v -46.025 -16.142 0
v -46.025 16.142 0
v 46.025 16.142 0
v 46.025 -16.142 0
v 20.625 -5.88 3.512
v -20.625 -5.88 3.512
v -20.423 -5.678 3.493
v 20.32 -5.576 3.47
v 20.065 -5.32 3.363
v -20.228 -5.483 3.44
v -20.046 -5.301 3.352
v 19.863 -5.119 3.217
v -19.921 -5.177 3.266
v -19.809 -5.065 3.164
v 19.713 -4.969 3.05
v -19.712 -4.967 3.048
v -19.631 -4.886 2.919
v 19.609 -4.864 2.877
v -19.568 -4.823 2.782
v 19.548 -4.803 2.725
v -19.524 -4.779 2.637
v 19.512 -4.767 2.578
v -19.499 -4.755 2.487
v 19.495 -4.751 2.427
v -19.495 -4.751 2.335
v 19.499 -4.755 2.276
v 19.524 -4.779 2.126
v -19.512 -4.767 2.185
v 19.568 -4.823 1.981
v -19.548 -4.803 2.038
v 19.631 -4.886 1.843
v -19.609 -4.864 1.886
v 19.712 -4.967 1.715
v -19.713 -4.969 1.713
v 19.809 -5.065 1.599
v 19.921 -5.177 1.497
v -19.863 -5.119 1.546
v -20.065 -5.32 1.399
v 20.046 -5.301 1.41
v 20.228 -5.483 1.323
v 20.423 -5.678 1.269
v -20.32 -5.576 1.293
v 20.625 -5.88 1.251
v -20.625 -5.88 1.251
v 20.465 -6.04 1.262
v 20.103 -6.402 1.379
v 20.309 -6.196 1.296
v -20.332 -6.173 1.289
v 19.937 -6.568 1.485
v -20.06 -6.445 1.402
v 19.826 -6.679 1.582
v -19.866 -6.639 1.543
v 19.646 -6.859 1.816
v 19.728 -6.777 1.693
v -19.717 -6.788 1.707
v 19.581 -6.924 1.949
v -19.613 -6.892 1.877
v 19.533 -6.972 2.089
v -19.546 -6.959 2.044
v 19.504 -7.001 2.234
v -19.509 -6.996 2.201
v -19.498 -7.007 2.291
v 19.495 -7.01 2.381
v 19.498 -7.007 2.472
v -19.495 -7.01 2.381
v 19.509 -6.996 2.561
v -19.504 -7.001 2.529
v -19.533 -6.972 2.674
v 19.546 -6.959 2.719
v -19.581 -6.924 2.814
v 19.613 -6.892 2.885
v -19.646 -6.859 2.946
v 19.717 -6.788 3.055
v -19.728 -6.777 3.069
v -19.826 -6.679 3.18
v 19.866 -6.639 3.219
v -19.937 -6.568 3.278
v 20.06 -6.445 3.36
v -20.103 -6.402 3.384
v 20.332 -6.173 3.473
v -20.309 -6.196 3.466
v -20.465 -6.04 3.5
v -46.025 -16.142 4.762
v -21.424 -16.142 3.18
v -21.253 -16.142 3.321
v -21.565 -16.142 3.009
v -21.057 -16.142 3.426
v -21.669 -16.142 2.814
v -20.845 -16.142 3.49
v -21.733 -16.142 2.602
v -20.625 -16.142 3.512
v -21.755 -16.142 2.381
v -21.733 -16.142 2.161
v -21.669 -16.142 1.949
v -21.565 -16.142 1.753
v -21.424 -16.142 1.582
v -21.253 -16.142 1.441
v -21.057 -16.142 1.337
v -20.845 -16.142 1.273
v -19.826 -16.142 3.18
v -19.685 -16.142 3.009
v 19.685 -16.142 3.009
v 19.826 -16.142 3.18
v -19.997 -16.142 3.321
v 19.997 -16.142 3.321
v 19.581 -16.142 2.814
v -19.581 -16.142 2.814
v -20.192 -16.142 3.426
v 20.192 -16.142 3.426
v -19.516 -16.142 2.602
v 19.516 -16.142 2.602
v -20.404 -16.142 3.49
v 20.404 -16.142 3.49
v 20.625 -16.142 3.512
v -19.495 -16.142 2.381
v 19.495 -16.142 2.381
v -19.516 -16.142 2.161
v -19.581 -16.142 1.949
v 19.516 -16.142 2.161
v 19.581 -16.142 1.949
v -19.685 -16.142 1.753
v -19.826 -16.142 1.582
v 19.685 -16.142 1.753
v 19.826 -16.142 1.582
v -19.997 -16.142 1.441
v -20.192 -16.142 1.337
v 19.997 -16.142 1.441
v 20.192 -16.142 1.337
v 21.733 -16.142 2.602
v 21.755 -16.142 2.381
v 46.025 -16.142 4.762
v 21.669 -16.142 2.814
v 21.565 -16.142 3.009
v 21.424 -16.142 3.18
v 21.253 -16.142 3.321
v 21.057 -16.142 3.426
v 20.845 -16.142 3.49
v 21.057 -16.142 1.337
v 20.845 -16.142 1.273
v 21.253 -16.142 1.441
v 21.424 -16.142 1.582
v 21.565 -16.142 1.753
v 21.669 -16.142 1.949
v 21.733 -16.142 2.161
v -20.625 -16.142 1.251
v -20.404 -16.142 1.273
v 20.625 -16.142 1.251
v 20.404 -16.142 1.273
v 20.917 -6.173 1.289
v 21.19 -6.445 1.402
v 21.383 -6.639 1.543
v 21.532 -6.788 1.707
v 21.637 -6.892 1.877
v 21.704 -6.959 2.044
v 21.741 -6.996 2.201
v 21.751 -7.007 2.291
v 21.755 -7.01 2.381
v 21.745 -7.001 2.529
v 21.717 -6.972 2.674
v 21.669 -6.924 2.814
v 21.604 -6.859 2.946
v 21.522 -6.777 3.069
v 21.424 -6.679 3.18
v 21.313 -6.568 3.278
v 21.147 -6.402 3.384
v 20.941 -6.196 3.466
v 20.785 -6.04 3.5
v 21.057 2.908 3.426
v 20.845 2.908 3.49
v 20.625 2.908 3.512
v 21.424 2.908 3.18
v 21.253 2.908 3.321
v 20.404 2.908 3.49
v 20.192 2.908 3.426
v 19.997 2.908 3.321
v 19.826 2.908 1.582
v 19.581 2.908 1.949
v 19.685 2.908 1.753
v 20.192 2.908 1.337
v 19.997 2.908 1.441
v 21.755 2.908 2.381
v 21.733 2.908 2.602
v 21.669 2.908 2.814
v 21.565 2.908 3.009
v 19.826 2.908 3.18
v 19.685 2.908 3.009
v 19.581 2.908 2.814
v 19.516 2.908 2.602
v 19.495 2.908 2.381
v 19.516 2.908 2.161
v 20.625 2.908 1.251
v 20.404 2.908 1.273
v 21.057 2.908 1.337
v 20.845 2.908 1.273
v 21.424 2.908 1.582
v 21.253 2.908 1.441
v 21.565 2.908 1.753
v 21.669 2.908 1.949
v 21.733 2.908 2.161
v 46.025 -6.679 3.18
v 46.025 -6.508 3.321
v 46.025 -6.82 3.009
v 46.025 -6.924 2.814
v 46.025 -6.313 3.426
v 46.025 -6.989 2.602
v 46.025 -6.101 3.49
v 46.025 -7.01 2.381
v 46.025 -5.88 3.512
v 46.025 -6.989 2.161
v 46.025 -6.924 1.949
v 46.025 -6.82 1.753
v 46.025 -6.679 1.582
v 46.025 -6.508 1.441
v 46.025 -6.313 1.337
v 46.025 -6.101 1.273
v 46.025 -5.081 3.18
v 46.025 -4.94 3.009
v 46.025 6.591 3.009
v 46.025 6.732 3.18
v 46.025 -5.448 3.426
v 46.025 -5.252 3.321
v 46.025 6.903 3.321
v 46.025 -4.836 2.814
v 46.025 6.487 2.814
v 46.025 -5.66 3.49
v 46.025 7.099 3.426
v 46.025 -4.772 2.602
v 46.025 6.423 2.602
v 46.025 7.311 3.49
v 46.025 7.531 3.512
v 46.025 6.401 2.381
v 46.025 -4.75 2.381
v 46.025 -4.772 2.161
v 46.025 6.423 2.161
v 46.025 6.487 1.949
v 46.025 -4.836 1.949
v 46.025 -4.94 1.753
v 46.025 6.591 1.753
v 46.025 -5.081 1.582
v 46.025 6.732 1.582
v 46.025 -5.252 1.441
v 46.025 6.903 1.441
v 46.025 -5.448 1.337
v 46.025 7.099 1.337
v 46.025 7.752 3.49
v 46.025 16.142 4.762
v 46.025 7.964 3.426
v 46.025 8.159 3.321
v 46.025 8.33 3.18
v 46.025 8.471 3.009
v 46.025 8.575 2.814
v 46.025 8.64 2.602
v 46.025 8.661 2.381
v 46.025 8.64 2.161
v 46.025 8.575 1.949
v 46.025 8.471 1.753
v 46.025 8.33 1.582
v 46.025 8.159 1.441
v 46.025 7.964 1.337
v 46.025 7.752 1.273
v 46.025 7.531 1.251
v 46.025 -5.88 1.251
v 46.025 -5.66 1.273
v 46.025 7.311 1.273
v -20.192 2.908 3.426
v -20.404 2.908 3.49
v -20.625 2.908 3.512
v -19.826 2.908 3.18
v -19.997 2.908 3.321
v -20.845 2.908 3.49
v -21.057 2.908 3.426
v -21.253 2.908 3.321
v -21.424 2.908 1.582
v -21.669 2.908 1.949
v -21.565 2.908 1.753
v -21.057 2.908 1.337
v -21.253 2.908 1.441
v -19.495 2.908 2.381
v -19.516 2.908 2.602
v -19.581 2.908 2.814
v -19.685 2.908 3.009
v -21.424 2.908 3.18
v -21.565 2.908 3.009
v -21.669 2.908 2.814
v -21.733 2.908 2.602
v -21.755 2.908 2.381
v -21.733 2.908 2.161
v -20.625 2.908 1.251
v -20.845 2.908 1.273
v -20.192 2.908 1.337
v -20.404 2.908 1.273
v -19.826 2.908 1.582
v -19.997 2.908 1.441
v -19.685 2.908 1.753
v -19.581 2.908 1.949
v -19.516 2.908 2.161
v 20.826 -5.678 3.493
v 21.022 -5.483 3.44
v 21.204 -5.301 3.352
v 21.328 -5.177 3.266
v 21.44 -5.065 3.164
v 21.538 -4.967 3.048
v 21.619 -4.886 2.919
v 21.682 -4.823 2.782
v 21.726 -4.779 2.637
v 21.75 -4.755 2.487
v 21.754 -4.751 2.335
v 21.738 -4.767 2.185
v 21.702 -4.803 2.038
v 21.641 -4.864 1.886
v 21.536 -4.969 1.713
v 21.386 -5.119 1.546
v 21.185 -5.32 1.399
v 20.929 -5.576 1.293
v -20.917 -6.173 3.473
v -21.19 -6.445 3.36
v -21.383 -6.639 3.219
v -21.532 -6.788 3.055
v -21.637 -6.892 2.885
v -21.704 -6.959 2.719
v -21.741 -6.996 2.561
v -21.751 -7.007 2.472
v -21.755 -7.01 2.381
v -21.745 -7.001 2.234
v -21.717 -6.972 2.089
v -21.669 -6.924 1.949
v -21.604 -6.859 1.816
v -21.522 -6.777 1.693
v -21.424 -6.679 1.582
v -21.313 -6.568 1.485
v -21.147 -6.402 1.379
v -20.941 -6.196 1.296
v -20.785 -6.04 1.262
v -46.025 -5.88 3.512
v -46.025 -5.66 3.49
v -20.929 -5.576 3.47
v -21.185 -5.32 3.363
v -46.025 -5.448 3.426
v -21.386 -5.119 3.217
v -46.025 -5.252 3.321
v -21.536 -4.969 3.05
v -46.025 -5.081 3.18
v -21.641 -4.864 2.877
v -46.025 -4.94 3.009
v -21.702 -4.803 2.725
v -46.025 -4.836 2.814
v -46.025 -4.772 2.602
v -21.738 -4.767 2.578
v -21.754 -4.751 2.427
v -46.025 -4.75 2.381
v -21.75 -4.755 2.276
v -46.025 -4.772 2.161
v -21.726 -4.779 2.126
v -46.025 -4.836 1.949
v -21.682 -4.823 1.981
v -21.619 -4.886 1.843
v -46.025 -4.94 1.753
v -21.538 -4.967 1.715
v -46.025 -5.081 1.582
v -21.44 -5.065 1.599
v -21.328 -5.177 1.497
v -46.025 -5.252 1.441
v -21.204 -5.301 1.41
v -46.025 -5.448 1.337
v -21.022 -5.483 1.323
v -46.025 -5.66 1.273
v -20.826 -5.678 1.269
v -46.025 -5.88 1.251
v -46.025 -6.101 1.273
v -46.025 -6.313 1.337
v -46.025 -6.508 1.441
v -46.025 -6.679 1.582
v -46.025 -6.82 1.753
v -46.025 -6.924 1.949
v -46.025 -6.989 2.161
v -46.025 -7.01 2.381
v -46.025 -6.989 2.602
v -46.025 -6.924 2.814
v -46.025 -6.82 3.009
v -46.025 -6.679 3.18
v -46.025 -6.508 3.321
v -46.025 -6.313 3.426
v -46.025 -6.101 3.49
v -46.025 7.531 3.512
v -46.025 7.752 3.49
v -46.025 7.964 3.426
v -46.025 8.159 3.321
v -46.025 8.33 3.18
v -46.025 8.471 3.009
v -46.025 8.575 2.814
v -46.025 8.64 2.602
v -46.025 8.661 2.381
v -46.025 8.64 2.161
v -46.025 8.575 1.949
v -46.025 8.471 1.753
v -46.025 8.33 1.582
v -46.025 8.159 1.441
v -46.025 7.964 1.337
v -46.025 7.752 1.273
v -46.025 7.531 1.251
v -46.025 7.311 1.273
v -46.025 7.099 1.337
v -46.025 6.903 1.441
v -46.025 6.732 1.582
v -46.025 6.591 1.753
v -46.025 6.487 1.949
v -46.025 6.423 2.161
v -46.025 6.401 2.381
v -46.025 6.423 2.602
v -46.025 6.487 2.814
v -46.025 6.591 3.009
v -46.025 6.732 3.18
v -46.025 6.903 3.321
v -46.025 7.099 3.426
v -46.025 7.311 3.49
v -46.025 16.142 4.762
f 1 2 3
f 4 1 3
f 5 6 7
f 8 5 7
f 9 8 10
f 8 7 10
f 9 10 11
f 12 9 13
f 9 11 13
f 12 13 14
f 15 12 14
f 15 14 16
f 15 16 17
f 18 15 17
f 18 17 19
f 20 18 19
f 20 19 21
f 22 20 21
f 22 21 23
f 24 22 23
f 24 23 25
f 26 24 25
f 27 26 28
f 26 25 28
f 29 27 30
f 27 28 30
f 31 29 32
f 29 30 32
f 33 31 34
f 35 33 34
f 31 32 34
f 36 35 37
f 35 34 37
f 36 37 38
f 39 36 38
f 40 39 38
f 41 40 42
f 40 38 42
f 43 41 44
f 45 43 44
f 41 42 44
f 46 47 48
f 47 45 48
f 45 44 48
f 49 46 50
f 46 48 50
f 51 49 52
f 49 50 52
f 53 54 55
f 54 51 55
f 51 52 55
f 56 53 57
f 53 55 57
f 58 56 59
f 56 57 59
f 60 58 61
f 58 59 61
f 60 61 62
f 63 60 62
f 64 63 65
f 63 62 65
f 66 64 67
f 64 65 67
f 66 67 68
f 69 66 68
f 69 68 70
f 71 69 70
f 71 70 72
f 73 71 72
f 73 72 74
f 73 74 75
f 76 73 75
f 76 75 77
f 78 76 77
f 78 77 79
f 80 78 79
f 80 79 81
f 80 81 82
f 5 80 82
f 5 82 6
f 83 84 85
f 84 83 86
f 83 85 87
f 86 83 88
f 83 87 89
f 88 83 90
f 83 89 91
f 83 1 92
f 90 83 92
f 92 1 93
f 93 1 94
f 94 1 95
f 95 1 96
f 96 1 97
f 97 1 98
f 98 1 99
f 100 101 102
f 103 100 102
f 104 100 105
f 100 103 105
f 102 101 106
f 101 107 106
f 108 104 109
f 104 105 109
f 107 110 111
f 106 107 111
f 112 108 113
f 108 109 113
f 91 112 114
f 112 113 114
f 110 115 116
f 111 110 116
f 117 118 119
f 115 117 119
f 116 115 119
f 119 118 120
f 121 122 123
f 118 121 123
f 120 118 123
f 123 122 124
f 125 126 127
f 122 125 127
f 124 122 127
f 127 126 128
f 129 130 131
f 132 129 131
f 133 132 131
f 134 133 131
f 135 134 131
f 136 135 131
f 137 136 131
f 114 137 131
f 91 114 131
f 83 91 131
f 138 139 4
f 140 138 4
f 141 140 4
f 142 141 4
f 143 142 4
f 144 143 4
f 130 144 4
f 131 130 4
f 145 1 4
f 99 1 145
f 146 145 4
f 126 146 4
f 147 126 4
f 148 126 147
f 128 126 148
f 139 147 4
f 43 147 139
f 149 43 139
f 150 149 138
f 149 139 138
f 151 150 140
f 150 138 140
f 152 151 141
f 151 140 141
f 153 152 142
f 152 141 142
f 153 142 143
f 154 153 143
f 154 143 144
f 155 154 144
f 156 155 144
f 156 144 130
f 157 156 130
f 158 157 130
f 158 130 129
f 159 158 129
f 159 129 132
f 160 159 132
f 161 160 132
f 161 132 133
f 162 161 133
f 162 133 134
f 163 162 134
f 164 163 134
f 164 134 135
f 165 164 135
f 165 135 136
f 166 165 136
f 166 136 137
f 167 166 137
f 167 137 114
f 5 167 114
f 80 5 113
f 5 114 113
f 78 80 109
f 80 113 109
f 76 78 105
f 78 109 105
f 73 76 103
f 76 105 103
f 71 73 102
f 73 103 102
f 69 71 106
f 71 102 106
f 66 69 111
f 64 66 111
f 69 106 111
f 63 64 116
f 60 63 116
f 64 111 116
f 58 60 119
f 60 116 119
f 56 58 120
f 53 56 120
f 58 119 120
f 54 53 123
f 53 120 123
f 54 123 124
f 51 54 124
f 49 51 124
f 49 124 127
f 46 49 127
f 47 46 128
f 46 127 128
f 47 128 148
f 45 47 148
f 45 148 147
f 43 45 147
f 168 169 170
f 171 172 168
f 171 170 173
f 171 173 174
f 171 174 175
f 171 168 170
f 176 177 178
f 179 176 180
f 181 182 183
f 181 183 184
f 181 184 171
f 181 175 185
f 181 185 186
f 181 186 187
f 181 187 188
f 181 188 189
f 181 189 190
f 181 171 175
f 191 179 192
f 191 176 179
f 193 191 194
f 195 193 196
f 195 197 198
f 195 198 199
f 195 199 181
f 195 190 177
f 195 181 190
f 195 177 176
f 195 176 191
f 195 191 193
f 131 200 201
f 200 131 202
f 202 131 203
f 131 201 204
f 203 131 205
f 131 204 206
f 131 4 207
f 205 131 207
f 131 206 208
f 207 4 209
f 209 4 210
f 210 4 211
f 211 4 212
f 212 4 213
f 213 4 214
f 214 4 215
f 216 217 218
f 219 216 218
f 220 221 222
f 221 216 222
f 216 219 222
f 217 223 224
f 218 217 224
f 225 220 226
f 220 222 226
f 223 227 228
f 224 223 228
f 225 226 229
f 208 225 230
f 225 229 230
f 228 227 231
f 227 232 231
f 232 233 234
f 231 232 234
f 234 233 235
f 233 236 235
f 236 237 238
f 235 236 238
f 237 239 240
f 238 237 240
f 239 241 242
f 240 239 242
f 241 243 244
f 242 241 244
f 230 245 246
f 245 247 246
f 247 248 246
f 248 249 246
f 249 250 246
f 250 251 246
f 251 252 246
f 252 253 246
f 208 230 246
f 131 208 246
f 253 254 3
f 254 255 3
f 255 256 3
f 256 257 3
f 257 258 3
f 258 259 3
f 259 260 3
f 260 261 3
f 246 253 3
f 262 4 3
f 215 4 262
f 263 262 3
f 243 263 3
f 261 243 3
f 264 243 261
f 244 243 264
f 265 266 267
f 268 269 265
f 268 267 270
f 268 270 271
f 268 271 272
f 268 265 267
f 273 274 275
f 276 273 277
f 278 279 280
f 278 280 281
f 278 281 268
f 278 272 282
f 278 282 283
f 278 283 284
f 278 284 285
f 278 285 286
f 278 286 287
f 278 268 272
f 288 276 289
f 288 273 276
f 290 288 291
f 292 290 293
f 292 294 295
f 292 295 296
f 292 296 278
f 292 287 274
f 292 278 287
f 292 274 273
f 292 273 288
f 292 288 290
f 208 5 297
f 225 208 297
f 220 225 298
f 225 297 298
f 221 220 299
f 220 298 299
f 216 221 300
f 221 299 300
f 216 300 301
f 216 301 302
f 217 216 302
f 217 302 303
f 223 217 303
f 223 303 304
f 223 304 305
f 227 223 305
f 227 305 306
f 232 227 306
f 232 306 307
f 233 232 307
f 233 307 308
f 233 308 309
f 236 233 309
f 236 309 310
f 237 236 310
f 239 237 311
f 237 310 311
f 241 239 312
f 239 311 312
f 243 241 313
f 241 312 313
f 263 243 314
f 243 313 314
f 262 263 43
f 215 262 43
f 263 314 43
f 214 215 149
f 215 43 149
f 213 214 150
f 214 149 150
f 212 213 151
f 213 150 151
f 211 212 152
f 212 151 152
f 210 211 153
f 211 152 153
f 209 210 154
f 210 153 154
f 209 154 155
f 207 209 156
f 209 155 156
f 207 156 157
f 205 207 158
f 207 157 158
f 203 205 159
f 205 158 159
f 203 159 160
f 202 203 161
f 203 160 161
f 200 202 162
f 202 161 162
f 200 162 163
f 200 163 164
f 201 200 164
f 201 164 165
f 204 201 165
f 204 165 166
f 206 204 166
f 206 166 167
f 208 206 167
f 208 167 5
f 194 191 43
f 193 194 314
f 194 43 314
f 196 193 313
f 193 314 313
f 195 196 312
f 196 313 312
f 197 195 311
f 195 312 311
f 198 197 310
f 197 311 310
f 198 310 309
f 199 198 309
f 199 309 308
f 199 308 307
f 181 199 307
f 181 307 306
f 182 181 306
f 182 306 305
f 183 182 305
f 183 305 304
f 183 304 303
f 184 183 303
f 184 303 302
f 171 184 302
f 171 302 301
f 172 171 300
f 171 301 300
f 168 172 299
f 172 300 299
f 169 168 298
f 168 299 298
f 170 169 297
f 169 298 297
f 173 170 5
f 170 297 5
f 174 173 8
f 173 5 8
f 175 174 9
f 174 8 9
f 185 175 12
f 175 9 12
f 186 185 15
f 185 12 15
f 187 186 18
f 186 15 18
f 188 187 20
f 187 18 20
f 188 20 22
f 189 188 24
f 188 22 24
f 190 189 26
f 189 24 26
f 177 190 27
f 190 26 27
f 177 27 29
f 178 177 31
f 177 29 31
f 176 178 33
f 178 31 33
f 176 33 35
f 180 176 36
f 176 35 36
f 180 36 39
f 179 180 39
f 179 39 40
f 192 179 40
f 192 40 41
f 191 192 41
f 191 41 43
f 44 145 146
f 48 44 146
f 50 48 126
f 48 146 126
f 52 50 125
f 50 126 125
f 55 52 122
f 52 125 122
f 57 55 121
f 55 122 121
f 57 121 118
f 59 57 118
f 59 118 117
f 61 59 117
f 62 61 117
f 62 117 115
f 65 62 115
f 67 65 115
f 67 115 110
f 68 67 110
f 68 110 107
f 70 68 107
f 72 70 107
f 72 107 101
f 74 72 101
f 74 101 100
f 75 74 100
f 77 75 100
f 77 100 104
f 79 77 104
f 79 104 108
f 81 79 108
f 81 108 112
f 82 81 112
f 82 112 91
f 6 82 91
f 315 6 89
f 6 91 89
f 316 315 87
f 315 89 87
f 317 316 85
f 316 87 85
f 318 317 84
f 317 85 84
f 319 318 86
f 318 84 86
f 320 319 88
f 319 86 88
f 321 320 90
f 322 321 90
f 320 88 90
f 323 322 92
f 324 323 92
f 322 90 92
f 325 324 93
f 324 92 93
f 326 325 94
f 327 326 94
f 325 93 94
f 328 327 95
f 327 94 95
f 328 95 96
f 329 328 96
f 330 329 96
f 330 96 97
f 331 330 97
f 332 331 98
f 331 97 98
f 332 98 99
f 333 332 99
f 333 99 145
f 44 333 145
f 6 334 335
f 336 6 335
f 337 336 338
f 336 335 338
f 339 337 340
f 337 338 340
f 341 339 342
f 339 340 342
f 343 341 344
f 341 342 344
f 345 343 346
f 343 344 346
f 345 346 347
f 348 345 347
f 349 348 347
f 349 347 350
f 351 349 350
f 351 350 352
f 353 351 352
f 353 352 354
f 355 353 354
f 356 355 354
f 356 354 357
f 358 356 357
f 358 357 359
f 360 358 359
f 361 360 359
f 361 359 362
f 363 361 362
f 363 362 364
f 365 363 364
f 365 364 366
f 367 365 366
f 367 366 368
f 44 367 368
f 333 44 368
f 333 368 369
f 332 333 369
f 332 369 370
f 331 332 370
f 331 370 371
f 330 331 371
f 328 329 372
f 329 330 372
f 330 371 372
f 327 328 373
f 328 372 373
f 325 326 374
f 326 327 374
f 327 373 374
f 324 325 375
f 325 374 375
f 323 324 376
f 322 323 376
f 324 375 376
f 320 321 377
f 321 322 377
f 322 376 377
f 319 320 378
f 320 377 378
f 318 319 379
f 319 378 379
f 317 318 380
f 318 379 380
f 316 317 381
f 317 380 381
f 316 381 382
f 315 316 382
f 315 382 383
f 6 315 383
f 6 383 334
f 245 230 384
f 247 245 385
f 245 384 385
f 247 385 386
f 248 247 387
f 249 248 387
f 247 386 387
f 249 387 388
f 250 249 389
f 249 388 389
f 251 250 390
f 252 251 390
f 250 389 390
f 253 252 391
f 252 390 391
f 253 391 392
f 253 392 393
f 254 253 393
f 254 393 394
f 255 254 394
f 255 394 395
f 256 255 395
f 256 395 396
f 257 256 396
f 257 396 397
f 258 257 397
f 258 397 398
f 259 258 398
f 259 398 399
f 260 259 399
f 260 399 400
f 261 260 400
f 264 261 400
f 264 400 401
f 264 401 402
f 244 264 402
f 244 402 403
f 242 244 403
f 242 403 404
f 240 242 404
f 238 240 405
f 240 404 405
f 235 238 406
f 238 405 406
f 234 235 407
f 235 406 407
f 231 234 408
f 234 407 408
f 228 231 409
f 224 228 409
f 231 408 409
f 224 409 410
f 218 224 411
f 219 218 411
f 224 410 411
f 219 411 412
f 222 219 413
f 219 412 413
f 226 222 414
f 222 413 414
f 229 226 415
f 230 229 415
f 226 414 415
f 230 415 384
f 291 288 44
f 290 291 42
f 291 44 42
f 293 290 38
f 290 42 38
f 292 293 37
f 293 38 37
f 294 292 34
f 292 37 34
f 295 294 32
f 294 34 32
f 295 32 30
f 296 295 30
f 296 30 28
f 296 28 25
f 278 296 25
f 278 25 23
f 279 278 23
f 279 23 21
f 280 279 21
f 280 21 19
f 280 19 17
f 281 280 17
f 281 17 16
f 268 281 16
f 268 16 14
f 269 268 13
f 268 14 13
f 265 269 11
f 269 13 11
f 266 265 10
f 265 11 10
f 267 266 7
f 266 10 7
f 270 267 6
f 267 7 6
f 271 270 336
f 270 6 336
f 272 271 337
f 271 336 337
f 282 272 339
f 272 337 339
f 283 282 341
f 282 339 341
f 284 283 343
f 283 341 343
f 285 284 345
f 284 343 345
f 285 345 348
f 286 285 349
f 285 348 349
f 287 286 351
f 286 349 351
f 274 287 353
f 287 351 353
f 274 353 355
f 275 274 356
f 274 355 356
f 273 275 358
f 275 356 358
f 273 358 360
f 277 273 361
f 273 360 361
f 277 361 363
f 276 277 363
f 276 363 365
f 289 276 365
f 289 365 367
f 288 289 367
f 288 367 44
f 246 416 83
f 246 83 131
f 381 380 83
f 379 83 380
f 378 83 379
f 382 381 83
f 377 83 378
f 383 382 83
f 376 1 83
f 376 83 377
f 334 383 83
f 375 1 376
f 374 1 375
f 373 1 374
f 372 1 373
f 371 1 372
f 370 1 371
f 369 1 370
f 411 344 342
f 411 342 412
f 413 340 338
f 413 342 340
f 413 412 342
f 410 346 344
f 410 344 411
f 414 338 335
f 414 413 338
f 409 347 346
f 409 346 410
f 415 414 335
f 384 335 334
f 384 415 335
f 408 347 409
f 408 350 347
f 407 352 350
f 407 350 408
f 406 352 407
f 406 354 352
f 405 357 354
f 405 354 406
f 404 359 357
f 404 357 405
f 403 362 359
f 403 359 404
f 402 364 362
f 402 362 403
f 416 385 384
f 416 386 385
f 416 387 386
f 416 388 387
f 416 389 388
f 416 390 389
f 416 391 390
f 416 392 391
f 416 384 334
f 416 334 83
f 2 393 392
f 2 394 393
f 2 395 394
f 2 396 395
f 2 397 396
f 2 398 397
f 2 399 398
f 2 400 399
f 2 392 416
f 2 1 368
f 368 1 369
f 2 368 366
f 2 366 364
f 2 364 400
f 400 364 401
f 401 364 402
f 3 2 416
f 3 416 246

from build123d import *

# Parameters (mm, degrees)
SKETCH1_W           = 92.0496
SKETCH1_H           = 32.2834
BOSS_EXTRUDE1_DEPTH = 4.7625
SKETCH2_R           = 1.1303
CUT_EXTRUDE1_DEPTH  = 19.05
SKETCH3_R           = 1.1303
CUT_EXTRUDE2_DEPTH  = 94.57544948


with BuildPart() as part:
    # Sketch1 → Boss-Extrude1 (new body)
    with BuildSketch(Plane.XY):
        Rectangle(SKETCH1_W, SKETCH1_H)
    extrude(amount=BOSS_EXTRUDE1_DEPTH)

    # Sketch2 → Cut-Extrude1 (cut)
    with BuildSketch(Plane.XZ.offset(16.1417)):
        with Locations(Location((-20.6248, 2.38125, 0), (0, 0, 270))):
            Circle(SKETCH2_R)
        with Locations(Location((20.6248, 2.38125, 0), (0, 0, 270))):
            Circle(SKETCH2_R)
    extrude(amount=-CUT_EXTRUDE1_DEPTH, mode=Mode.SUBTRACT)

    # Sketch3 → Cut-Extrude2 (cut, through all)
    with BuildSketch(Plane.ZY.offset(46.0248)):
        with Locations((2.38125, 7.5311)):
            Circle(SKETCH3_R)
        with Locations((2.38125, -5.8801)):
            Circle(SKETCH3_R)
    extrude(amount=-CUT_EXTRUDE2_DEPTH, mode=Mode.SUBTRACT)


solid = part.part
